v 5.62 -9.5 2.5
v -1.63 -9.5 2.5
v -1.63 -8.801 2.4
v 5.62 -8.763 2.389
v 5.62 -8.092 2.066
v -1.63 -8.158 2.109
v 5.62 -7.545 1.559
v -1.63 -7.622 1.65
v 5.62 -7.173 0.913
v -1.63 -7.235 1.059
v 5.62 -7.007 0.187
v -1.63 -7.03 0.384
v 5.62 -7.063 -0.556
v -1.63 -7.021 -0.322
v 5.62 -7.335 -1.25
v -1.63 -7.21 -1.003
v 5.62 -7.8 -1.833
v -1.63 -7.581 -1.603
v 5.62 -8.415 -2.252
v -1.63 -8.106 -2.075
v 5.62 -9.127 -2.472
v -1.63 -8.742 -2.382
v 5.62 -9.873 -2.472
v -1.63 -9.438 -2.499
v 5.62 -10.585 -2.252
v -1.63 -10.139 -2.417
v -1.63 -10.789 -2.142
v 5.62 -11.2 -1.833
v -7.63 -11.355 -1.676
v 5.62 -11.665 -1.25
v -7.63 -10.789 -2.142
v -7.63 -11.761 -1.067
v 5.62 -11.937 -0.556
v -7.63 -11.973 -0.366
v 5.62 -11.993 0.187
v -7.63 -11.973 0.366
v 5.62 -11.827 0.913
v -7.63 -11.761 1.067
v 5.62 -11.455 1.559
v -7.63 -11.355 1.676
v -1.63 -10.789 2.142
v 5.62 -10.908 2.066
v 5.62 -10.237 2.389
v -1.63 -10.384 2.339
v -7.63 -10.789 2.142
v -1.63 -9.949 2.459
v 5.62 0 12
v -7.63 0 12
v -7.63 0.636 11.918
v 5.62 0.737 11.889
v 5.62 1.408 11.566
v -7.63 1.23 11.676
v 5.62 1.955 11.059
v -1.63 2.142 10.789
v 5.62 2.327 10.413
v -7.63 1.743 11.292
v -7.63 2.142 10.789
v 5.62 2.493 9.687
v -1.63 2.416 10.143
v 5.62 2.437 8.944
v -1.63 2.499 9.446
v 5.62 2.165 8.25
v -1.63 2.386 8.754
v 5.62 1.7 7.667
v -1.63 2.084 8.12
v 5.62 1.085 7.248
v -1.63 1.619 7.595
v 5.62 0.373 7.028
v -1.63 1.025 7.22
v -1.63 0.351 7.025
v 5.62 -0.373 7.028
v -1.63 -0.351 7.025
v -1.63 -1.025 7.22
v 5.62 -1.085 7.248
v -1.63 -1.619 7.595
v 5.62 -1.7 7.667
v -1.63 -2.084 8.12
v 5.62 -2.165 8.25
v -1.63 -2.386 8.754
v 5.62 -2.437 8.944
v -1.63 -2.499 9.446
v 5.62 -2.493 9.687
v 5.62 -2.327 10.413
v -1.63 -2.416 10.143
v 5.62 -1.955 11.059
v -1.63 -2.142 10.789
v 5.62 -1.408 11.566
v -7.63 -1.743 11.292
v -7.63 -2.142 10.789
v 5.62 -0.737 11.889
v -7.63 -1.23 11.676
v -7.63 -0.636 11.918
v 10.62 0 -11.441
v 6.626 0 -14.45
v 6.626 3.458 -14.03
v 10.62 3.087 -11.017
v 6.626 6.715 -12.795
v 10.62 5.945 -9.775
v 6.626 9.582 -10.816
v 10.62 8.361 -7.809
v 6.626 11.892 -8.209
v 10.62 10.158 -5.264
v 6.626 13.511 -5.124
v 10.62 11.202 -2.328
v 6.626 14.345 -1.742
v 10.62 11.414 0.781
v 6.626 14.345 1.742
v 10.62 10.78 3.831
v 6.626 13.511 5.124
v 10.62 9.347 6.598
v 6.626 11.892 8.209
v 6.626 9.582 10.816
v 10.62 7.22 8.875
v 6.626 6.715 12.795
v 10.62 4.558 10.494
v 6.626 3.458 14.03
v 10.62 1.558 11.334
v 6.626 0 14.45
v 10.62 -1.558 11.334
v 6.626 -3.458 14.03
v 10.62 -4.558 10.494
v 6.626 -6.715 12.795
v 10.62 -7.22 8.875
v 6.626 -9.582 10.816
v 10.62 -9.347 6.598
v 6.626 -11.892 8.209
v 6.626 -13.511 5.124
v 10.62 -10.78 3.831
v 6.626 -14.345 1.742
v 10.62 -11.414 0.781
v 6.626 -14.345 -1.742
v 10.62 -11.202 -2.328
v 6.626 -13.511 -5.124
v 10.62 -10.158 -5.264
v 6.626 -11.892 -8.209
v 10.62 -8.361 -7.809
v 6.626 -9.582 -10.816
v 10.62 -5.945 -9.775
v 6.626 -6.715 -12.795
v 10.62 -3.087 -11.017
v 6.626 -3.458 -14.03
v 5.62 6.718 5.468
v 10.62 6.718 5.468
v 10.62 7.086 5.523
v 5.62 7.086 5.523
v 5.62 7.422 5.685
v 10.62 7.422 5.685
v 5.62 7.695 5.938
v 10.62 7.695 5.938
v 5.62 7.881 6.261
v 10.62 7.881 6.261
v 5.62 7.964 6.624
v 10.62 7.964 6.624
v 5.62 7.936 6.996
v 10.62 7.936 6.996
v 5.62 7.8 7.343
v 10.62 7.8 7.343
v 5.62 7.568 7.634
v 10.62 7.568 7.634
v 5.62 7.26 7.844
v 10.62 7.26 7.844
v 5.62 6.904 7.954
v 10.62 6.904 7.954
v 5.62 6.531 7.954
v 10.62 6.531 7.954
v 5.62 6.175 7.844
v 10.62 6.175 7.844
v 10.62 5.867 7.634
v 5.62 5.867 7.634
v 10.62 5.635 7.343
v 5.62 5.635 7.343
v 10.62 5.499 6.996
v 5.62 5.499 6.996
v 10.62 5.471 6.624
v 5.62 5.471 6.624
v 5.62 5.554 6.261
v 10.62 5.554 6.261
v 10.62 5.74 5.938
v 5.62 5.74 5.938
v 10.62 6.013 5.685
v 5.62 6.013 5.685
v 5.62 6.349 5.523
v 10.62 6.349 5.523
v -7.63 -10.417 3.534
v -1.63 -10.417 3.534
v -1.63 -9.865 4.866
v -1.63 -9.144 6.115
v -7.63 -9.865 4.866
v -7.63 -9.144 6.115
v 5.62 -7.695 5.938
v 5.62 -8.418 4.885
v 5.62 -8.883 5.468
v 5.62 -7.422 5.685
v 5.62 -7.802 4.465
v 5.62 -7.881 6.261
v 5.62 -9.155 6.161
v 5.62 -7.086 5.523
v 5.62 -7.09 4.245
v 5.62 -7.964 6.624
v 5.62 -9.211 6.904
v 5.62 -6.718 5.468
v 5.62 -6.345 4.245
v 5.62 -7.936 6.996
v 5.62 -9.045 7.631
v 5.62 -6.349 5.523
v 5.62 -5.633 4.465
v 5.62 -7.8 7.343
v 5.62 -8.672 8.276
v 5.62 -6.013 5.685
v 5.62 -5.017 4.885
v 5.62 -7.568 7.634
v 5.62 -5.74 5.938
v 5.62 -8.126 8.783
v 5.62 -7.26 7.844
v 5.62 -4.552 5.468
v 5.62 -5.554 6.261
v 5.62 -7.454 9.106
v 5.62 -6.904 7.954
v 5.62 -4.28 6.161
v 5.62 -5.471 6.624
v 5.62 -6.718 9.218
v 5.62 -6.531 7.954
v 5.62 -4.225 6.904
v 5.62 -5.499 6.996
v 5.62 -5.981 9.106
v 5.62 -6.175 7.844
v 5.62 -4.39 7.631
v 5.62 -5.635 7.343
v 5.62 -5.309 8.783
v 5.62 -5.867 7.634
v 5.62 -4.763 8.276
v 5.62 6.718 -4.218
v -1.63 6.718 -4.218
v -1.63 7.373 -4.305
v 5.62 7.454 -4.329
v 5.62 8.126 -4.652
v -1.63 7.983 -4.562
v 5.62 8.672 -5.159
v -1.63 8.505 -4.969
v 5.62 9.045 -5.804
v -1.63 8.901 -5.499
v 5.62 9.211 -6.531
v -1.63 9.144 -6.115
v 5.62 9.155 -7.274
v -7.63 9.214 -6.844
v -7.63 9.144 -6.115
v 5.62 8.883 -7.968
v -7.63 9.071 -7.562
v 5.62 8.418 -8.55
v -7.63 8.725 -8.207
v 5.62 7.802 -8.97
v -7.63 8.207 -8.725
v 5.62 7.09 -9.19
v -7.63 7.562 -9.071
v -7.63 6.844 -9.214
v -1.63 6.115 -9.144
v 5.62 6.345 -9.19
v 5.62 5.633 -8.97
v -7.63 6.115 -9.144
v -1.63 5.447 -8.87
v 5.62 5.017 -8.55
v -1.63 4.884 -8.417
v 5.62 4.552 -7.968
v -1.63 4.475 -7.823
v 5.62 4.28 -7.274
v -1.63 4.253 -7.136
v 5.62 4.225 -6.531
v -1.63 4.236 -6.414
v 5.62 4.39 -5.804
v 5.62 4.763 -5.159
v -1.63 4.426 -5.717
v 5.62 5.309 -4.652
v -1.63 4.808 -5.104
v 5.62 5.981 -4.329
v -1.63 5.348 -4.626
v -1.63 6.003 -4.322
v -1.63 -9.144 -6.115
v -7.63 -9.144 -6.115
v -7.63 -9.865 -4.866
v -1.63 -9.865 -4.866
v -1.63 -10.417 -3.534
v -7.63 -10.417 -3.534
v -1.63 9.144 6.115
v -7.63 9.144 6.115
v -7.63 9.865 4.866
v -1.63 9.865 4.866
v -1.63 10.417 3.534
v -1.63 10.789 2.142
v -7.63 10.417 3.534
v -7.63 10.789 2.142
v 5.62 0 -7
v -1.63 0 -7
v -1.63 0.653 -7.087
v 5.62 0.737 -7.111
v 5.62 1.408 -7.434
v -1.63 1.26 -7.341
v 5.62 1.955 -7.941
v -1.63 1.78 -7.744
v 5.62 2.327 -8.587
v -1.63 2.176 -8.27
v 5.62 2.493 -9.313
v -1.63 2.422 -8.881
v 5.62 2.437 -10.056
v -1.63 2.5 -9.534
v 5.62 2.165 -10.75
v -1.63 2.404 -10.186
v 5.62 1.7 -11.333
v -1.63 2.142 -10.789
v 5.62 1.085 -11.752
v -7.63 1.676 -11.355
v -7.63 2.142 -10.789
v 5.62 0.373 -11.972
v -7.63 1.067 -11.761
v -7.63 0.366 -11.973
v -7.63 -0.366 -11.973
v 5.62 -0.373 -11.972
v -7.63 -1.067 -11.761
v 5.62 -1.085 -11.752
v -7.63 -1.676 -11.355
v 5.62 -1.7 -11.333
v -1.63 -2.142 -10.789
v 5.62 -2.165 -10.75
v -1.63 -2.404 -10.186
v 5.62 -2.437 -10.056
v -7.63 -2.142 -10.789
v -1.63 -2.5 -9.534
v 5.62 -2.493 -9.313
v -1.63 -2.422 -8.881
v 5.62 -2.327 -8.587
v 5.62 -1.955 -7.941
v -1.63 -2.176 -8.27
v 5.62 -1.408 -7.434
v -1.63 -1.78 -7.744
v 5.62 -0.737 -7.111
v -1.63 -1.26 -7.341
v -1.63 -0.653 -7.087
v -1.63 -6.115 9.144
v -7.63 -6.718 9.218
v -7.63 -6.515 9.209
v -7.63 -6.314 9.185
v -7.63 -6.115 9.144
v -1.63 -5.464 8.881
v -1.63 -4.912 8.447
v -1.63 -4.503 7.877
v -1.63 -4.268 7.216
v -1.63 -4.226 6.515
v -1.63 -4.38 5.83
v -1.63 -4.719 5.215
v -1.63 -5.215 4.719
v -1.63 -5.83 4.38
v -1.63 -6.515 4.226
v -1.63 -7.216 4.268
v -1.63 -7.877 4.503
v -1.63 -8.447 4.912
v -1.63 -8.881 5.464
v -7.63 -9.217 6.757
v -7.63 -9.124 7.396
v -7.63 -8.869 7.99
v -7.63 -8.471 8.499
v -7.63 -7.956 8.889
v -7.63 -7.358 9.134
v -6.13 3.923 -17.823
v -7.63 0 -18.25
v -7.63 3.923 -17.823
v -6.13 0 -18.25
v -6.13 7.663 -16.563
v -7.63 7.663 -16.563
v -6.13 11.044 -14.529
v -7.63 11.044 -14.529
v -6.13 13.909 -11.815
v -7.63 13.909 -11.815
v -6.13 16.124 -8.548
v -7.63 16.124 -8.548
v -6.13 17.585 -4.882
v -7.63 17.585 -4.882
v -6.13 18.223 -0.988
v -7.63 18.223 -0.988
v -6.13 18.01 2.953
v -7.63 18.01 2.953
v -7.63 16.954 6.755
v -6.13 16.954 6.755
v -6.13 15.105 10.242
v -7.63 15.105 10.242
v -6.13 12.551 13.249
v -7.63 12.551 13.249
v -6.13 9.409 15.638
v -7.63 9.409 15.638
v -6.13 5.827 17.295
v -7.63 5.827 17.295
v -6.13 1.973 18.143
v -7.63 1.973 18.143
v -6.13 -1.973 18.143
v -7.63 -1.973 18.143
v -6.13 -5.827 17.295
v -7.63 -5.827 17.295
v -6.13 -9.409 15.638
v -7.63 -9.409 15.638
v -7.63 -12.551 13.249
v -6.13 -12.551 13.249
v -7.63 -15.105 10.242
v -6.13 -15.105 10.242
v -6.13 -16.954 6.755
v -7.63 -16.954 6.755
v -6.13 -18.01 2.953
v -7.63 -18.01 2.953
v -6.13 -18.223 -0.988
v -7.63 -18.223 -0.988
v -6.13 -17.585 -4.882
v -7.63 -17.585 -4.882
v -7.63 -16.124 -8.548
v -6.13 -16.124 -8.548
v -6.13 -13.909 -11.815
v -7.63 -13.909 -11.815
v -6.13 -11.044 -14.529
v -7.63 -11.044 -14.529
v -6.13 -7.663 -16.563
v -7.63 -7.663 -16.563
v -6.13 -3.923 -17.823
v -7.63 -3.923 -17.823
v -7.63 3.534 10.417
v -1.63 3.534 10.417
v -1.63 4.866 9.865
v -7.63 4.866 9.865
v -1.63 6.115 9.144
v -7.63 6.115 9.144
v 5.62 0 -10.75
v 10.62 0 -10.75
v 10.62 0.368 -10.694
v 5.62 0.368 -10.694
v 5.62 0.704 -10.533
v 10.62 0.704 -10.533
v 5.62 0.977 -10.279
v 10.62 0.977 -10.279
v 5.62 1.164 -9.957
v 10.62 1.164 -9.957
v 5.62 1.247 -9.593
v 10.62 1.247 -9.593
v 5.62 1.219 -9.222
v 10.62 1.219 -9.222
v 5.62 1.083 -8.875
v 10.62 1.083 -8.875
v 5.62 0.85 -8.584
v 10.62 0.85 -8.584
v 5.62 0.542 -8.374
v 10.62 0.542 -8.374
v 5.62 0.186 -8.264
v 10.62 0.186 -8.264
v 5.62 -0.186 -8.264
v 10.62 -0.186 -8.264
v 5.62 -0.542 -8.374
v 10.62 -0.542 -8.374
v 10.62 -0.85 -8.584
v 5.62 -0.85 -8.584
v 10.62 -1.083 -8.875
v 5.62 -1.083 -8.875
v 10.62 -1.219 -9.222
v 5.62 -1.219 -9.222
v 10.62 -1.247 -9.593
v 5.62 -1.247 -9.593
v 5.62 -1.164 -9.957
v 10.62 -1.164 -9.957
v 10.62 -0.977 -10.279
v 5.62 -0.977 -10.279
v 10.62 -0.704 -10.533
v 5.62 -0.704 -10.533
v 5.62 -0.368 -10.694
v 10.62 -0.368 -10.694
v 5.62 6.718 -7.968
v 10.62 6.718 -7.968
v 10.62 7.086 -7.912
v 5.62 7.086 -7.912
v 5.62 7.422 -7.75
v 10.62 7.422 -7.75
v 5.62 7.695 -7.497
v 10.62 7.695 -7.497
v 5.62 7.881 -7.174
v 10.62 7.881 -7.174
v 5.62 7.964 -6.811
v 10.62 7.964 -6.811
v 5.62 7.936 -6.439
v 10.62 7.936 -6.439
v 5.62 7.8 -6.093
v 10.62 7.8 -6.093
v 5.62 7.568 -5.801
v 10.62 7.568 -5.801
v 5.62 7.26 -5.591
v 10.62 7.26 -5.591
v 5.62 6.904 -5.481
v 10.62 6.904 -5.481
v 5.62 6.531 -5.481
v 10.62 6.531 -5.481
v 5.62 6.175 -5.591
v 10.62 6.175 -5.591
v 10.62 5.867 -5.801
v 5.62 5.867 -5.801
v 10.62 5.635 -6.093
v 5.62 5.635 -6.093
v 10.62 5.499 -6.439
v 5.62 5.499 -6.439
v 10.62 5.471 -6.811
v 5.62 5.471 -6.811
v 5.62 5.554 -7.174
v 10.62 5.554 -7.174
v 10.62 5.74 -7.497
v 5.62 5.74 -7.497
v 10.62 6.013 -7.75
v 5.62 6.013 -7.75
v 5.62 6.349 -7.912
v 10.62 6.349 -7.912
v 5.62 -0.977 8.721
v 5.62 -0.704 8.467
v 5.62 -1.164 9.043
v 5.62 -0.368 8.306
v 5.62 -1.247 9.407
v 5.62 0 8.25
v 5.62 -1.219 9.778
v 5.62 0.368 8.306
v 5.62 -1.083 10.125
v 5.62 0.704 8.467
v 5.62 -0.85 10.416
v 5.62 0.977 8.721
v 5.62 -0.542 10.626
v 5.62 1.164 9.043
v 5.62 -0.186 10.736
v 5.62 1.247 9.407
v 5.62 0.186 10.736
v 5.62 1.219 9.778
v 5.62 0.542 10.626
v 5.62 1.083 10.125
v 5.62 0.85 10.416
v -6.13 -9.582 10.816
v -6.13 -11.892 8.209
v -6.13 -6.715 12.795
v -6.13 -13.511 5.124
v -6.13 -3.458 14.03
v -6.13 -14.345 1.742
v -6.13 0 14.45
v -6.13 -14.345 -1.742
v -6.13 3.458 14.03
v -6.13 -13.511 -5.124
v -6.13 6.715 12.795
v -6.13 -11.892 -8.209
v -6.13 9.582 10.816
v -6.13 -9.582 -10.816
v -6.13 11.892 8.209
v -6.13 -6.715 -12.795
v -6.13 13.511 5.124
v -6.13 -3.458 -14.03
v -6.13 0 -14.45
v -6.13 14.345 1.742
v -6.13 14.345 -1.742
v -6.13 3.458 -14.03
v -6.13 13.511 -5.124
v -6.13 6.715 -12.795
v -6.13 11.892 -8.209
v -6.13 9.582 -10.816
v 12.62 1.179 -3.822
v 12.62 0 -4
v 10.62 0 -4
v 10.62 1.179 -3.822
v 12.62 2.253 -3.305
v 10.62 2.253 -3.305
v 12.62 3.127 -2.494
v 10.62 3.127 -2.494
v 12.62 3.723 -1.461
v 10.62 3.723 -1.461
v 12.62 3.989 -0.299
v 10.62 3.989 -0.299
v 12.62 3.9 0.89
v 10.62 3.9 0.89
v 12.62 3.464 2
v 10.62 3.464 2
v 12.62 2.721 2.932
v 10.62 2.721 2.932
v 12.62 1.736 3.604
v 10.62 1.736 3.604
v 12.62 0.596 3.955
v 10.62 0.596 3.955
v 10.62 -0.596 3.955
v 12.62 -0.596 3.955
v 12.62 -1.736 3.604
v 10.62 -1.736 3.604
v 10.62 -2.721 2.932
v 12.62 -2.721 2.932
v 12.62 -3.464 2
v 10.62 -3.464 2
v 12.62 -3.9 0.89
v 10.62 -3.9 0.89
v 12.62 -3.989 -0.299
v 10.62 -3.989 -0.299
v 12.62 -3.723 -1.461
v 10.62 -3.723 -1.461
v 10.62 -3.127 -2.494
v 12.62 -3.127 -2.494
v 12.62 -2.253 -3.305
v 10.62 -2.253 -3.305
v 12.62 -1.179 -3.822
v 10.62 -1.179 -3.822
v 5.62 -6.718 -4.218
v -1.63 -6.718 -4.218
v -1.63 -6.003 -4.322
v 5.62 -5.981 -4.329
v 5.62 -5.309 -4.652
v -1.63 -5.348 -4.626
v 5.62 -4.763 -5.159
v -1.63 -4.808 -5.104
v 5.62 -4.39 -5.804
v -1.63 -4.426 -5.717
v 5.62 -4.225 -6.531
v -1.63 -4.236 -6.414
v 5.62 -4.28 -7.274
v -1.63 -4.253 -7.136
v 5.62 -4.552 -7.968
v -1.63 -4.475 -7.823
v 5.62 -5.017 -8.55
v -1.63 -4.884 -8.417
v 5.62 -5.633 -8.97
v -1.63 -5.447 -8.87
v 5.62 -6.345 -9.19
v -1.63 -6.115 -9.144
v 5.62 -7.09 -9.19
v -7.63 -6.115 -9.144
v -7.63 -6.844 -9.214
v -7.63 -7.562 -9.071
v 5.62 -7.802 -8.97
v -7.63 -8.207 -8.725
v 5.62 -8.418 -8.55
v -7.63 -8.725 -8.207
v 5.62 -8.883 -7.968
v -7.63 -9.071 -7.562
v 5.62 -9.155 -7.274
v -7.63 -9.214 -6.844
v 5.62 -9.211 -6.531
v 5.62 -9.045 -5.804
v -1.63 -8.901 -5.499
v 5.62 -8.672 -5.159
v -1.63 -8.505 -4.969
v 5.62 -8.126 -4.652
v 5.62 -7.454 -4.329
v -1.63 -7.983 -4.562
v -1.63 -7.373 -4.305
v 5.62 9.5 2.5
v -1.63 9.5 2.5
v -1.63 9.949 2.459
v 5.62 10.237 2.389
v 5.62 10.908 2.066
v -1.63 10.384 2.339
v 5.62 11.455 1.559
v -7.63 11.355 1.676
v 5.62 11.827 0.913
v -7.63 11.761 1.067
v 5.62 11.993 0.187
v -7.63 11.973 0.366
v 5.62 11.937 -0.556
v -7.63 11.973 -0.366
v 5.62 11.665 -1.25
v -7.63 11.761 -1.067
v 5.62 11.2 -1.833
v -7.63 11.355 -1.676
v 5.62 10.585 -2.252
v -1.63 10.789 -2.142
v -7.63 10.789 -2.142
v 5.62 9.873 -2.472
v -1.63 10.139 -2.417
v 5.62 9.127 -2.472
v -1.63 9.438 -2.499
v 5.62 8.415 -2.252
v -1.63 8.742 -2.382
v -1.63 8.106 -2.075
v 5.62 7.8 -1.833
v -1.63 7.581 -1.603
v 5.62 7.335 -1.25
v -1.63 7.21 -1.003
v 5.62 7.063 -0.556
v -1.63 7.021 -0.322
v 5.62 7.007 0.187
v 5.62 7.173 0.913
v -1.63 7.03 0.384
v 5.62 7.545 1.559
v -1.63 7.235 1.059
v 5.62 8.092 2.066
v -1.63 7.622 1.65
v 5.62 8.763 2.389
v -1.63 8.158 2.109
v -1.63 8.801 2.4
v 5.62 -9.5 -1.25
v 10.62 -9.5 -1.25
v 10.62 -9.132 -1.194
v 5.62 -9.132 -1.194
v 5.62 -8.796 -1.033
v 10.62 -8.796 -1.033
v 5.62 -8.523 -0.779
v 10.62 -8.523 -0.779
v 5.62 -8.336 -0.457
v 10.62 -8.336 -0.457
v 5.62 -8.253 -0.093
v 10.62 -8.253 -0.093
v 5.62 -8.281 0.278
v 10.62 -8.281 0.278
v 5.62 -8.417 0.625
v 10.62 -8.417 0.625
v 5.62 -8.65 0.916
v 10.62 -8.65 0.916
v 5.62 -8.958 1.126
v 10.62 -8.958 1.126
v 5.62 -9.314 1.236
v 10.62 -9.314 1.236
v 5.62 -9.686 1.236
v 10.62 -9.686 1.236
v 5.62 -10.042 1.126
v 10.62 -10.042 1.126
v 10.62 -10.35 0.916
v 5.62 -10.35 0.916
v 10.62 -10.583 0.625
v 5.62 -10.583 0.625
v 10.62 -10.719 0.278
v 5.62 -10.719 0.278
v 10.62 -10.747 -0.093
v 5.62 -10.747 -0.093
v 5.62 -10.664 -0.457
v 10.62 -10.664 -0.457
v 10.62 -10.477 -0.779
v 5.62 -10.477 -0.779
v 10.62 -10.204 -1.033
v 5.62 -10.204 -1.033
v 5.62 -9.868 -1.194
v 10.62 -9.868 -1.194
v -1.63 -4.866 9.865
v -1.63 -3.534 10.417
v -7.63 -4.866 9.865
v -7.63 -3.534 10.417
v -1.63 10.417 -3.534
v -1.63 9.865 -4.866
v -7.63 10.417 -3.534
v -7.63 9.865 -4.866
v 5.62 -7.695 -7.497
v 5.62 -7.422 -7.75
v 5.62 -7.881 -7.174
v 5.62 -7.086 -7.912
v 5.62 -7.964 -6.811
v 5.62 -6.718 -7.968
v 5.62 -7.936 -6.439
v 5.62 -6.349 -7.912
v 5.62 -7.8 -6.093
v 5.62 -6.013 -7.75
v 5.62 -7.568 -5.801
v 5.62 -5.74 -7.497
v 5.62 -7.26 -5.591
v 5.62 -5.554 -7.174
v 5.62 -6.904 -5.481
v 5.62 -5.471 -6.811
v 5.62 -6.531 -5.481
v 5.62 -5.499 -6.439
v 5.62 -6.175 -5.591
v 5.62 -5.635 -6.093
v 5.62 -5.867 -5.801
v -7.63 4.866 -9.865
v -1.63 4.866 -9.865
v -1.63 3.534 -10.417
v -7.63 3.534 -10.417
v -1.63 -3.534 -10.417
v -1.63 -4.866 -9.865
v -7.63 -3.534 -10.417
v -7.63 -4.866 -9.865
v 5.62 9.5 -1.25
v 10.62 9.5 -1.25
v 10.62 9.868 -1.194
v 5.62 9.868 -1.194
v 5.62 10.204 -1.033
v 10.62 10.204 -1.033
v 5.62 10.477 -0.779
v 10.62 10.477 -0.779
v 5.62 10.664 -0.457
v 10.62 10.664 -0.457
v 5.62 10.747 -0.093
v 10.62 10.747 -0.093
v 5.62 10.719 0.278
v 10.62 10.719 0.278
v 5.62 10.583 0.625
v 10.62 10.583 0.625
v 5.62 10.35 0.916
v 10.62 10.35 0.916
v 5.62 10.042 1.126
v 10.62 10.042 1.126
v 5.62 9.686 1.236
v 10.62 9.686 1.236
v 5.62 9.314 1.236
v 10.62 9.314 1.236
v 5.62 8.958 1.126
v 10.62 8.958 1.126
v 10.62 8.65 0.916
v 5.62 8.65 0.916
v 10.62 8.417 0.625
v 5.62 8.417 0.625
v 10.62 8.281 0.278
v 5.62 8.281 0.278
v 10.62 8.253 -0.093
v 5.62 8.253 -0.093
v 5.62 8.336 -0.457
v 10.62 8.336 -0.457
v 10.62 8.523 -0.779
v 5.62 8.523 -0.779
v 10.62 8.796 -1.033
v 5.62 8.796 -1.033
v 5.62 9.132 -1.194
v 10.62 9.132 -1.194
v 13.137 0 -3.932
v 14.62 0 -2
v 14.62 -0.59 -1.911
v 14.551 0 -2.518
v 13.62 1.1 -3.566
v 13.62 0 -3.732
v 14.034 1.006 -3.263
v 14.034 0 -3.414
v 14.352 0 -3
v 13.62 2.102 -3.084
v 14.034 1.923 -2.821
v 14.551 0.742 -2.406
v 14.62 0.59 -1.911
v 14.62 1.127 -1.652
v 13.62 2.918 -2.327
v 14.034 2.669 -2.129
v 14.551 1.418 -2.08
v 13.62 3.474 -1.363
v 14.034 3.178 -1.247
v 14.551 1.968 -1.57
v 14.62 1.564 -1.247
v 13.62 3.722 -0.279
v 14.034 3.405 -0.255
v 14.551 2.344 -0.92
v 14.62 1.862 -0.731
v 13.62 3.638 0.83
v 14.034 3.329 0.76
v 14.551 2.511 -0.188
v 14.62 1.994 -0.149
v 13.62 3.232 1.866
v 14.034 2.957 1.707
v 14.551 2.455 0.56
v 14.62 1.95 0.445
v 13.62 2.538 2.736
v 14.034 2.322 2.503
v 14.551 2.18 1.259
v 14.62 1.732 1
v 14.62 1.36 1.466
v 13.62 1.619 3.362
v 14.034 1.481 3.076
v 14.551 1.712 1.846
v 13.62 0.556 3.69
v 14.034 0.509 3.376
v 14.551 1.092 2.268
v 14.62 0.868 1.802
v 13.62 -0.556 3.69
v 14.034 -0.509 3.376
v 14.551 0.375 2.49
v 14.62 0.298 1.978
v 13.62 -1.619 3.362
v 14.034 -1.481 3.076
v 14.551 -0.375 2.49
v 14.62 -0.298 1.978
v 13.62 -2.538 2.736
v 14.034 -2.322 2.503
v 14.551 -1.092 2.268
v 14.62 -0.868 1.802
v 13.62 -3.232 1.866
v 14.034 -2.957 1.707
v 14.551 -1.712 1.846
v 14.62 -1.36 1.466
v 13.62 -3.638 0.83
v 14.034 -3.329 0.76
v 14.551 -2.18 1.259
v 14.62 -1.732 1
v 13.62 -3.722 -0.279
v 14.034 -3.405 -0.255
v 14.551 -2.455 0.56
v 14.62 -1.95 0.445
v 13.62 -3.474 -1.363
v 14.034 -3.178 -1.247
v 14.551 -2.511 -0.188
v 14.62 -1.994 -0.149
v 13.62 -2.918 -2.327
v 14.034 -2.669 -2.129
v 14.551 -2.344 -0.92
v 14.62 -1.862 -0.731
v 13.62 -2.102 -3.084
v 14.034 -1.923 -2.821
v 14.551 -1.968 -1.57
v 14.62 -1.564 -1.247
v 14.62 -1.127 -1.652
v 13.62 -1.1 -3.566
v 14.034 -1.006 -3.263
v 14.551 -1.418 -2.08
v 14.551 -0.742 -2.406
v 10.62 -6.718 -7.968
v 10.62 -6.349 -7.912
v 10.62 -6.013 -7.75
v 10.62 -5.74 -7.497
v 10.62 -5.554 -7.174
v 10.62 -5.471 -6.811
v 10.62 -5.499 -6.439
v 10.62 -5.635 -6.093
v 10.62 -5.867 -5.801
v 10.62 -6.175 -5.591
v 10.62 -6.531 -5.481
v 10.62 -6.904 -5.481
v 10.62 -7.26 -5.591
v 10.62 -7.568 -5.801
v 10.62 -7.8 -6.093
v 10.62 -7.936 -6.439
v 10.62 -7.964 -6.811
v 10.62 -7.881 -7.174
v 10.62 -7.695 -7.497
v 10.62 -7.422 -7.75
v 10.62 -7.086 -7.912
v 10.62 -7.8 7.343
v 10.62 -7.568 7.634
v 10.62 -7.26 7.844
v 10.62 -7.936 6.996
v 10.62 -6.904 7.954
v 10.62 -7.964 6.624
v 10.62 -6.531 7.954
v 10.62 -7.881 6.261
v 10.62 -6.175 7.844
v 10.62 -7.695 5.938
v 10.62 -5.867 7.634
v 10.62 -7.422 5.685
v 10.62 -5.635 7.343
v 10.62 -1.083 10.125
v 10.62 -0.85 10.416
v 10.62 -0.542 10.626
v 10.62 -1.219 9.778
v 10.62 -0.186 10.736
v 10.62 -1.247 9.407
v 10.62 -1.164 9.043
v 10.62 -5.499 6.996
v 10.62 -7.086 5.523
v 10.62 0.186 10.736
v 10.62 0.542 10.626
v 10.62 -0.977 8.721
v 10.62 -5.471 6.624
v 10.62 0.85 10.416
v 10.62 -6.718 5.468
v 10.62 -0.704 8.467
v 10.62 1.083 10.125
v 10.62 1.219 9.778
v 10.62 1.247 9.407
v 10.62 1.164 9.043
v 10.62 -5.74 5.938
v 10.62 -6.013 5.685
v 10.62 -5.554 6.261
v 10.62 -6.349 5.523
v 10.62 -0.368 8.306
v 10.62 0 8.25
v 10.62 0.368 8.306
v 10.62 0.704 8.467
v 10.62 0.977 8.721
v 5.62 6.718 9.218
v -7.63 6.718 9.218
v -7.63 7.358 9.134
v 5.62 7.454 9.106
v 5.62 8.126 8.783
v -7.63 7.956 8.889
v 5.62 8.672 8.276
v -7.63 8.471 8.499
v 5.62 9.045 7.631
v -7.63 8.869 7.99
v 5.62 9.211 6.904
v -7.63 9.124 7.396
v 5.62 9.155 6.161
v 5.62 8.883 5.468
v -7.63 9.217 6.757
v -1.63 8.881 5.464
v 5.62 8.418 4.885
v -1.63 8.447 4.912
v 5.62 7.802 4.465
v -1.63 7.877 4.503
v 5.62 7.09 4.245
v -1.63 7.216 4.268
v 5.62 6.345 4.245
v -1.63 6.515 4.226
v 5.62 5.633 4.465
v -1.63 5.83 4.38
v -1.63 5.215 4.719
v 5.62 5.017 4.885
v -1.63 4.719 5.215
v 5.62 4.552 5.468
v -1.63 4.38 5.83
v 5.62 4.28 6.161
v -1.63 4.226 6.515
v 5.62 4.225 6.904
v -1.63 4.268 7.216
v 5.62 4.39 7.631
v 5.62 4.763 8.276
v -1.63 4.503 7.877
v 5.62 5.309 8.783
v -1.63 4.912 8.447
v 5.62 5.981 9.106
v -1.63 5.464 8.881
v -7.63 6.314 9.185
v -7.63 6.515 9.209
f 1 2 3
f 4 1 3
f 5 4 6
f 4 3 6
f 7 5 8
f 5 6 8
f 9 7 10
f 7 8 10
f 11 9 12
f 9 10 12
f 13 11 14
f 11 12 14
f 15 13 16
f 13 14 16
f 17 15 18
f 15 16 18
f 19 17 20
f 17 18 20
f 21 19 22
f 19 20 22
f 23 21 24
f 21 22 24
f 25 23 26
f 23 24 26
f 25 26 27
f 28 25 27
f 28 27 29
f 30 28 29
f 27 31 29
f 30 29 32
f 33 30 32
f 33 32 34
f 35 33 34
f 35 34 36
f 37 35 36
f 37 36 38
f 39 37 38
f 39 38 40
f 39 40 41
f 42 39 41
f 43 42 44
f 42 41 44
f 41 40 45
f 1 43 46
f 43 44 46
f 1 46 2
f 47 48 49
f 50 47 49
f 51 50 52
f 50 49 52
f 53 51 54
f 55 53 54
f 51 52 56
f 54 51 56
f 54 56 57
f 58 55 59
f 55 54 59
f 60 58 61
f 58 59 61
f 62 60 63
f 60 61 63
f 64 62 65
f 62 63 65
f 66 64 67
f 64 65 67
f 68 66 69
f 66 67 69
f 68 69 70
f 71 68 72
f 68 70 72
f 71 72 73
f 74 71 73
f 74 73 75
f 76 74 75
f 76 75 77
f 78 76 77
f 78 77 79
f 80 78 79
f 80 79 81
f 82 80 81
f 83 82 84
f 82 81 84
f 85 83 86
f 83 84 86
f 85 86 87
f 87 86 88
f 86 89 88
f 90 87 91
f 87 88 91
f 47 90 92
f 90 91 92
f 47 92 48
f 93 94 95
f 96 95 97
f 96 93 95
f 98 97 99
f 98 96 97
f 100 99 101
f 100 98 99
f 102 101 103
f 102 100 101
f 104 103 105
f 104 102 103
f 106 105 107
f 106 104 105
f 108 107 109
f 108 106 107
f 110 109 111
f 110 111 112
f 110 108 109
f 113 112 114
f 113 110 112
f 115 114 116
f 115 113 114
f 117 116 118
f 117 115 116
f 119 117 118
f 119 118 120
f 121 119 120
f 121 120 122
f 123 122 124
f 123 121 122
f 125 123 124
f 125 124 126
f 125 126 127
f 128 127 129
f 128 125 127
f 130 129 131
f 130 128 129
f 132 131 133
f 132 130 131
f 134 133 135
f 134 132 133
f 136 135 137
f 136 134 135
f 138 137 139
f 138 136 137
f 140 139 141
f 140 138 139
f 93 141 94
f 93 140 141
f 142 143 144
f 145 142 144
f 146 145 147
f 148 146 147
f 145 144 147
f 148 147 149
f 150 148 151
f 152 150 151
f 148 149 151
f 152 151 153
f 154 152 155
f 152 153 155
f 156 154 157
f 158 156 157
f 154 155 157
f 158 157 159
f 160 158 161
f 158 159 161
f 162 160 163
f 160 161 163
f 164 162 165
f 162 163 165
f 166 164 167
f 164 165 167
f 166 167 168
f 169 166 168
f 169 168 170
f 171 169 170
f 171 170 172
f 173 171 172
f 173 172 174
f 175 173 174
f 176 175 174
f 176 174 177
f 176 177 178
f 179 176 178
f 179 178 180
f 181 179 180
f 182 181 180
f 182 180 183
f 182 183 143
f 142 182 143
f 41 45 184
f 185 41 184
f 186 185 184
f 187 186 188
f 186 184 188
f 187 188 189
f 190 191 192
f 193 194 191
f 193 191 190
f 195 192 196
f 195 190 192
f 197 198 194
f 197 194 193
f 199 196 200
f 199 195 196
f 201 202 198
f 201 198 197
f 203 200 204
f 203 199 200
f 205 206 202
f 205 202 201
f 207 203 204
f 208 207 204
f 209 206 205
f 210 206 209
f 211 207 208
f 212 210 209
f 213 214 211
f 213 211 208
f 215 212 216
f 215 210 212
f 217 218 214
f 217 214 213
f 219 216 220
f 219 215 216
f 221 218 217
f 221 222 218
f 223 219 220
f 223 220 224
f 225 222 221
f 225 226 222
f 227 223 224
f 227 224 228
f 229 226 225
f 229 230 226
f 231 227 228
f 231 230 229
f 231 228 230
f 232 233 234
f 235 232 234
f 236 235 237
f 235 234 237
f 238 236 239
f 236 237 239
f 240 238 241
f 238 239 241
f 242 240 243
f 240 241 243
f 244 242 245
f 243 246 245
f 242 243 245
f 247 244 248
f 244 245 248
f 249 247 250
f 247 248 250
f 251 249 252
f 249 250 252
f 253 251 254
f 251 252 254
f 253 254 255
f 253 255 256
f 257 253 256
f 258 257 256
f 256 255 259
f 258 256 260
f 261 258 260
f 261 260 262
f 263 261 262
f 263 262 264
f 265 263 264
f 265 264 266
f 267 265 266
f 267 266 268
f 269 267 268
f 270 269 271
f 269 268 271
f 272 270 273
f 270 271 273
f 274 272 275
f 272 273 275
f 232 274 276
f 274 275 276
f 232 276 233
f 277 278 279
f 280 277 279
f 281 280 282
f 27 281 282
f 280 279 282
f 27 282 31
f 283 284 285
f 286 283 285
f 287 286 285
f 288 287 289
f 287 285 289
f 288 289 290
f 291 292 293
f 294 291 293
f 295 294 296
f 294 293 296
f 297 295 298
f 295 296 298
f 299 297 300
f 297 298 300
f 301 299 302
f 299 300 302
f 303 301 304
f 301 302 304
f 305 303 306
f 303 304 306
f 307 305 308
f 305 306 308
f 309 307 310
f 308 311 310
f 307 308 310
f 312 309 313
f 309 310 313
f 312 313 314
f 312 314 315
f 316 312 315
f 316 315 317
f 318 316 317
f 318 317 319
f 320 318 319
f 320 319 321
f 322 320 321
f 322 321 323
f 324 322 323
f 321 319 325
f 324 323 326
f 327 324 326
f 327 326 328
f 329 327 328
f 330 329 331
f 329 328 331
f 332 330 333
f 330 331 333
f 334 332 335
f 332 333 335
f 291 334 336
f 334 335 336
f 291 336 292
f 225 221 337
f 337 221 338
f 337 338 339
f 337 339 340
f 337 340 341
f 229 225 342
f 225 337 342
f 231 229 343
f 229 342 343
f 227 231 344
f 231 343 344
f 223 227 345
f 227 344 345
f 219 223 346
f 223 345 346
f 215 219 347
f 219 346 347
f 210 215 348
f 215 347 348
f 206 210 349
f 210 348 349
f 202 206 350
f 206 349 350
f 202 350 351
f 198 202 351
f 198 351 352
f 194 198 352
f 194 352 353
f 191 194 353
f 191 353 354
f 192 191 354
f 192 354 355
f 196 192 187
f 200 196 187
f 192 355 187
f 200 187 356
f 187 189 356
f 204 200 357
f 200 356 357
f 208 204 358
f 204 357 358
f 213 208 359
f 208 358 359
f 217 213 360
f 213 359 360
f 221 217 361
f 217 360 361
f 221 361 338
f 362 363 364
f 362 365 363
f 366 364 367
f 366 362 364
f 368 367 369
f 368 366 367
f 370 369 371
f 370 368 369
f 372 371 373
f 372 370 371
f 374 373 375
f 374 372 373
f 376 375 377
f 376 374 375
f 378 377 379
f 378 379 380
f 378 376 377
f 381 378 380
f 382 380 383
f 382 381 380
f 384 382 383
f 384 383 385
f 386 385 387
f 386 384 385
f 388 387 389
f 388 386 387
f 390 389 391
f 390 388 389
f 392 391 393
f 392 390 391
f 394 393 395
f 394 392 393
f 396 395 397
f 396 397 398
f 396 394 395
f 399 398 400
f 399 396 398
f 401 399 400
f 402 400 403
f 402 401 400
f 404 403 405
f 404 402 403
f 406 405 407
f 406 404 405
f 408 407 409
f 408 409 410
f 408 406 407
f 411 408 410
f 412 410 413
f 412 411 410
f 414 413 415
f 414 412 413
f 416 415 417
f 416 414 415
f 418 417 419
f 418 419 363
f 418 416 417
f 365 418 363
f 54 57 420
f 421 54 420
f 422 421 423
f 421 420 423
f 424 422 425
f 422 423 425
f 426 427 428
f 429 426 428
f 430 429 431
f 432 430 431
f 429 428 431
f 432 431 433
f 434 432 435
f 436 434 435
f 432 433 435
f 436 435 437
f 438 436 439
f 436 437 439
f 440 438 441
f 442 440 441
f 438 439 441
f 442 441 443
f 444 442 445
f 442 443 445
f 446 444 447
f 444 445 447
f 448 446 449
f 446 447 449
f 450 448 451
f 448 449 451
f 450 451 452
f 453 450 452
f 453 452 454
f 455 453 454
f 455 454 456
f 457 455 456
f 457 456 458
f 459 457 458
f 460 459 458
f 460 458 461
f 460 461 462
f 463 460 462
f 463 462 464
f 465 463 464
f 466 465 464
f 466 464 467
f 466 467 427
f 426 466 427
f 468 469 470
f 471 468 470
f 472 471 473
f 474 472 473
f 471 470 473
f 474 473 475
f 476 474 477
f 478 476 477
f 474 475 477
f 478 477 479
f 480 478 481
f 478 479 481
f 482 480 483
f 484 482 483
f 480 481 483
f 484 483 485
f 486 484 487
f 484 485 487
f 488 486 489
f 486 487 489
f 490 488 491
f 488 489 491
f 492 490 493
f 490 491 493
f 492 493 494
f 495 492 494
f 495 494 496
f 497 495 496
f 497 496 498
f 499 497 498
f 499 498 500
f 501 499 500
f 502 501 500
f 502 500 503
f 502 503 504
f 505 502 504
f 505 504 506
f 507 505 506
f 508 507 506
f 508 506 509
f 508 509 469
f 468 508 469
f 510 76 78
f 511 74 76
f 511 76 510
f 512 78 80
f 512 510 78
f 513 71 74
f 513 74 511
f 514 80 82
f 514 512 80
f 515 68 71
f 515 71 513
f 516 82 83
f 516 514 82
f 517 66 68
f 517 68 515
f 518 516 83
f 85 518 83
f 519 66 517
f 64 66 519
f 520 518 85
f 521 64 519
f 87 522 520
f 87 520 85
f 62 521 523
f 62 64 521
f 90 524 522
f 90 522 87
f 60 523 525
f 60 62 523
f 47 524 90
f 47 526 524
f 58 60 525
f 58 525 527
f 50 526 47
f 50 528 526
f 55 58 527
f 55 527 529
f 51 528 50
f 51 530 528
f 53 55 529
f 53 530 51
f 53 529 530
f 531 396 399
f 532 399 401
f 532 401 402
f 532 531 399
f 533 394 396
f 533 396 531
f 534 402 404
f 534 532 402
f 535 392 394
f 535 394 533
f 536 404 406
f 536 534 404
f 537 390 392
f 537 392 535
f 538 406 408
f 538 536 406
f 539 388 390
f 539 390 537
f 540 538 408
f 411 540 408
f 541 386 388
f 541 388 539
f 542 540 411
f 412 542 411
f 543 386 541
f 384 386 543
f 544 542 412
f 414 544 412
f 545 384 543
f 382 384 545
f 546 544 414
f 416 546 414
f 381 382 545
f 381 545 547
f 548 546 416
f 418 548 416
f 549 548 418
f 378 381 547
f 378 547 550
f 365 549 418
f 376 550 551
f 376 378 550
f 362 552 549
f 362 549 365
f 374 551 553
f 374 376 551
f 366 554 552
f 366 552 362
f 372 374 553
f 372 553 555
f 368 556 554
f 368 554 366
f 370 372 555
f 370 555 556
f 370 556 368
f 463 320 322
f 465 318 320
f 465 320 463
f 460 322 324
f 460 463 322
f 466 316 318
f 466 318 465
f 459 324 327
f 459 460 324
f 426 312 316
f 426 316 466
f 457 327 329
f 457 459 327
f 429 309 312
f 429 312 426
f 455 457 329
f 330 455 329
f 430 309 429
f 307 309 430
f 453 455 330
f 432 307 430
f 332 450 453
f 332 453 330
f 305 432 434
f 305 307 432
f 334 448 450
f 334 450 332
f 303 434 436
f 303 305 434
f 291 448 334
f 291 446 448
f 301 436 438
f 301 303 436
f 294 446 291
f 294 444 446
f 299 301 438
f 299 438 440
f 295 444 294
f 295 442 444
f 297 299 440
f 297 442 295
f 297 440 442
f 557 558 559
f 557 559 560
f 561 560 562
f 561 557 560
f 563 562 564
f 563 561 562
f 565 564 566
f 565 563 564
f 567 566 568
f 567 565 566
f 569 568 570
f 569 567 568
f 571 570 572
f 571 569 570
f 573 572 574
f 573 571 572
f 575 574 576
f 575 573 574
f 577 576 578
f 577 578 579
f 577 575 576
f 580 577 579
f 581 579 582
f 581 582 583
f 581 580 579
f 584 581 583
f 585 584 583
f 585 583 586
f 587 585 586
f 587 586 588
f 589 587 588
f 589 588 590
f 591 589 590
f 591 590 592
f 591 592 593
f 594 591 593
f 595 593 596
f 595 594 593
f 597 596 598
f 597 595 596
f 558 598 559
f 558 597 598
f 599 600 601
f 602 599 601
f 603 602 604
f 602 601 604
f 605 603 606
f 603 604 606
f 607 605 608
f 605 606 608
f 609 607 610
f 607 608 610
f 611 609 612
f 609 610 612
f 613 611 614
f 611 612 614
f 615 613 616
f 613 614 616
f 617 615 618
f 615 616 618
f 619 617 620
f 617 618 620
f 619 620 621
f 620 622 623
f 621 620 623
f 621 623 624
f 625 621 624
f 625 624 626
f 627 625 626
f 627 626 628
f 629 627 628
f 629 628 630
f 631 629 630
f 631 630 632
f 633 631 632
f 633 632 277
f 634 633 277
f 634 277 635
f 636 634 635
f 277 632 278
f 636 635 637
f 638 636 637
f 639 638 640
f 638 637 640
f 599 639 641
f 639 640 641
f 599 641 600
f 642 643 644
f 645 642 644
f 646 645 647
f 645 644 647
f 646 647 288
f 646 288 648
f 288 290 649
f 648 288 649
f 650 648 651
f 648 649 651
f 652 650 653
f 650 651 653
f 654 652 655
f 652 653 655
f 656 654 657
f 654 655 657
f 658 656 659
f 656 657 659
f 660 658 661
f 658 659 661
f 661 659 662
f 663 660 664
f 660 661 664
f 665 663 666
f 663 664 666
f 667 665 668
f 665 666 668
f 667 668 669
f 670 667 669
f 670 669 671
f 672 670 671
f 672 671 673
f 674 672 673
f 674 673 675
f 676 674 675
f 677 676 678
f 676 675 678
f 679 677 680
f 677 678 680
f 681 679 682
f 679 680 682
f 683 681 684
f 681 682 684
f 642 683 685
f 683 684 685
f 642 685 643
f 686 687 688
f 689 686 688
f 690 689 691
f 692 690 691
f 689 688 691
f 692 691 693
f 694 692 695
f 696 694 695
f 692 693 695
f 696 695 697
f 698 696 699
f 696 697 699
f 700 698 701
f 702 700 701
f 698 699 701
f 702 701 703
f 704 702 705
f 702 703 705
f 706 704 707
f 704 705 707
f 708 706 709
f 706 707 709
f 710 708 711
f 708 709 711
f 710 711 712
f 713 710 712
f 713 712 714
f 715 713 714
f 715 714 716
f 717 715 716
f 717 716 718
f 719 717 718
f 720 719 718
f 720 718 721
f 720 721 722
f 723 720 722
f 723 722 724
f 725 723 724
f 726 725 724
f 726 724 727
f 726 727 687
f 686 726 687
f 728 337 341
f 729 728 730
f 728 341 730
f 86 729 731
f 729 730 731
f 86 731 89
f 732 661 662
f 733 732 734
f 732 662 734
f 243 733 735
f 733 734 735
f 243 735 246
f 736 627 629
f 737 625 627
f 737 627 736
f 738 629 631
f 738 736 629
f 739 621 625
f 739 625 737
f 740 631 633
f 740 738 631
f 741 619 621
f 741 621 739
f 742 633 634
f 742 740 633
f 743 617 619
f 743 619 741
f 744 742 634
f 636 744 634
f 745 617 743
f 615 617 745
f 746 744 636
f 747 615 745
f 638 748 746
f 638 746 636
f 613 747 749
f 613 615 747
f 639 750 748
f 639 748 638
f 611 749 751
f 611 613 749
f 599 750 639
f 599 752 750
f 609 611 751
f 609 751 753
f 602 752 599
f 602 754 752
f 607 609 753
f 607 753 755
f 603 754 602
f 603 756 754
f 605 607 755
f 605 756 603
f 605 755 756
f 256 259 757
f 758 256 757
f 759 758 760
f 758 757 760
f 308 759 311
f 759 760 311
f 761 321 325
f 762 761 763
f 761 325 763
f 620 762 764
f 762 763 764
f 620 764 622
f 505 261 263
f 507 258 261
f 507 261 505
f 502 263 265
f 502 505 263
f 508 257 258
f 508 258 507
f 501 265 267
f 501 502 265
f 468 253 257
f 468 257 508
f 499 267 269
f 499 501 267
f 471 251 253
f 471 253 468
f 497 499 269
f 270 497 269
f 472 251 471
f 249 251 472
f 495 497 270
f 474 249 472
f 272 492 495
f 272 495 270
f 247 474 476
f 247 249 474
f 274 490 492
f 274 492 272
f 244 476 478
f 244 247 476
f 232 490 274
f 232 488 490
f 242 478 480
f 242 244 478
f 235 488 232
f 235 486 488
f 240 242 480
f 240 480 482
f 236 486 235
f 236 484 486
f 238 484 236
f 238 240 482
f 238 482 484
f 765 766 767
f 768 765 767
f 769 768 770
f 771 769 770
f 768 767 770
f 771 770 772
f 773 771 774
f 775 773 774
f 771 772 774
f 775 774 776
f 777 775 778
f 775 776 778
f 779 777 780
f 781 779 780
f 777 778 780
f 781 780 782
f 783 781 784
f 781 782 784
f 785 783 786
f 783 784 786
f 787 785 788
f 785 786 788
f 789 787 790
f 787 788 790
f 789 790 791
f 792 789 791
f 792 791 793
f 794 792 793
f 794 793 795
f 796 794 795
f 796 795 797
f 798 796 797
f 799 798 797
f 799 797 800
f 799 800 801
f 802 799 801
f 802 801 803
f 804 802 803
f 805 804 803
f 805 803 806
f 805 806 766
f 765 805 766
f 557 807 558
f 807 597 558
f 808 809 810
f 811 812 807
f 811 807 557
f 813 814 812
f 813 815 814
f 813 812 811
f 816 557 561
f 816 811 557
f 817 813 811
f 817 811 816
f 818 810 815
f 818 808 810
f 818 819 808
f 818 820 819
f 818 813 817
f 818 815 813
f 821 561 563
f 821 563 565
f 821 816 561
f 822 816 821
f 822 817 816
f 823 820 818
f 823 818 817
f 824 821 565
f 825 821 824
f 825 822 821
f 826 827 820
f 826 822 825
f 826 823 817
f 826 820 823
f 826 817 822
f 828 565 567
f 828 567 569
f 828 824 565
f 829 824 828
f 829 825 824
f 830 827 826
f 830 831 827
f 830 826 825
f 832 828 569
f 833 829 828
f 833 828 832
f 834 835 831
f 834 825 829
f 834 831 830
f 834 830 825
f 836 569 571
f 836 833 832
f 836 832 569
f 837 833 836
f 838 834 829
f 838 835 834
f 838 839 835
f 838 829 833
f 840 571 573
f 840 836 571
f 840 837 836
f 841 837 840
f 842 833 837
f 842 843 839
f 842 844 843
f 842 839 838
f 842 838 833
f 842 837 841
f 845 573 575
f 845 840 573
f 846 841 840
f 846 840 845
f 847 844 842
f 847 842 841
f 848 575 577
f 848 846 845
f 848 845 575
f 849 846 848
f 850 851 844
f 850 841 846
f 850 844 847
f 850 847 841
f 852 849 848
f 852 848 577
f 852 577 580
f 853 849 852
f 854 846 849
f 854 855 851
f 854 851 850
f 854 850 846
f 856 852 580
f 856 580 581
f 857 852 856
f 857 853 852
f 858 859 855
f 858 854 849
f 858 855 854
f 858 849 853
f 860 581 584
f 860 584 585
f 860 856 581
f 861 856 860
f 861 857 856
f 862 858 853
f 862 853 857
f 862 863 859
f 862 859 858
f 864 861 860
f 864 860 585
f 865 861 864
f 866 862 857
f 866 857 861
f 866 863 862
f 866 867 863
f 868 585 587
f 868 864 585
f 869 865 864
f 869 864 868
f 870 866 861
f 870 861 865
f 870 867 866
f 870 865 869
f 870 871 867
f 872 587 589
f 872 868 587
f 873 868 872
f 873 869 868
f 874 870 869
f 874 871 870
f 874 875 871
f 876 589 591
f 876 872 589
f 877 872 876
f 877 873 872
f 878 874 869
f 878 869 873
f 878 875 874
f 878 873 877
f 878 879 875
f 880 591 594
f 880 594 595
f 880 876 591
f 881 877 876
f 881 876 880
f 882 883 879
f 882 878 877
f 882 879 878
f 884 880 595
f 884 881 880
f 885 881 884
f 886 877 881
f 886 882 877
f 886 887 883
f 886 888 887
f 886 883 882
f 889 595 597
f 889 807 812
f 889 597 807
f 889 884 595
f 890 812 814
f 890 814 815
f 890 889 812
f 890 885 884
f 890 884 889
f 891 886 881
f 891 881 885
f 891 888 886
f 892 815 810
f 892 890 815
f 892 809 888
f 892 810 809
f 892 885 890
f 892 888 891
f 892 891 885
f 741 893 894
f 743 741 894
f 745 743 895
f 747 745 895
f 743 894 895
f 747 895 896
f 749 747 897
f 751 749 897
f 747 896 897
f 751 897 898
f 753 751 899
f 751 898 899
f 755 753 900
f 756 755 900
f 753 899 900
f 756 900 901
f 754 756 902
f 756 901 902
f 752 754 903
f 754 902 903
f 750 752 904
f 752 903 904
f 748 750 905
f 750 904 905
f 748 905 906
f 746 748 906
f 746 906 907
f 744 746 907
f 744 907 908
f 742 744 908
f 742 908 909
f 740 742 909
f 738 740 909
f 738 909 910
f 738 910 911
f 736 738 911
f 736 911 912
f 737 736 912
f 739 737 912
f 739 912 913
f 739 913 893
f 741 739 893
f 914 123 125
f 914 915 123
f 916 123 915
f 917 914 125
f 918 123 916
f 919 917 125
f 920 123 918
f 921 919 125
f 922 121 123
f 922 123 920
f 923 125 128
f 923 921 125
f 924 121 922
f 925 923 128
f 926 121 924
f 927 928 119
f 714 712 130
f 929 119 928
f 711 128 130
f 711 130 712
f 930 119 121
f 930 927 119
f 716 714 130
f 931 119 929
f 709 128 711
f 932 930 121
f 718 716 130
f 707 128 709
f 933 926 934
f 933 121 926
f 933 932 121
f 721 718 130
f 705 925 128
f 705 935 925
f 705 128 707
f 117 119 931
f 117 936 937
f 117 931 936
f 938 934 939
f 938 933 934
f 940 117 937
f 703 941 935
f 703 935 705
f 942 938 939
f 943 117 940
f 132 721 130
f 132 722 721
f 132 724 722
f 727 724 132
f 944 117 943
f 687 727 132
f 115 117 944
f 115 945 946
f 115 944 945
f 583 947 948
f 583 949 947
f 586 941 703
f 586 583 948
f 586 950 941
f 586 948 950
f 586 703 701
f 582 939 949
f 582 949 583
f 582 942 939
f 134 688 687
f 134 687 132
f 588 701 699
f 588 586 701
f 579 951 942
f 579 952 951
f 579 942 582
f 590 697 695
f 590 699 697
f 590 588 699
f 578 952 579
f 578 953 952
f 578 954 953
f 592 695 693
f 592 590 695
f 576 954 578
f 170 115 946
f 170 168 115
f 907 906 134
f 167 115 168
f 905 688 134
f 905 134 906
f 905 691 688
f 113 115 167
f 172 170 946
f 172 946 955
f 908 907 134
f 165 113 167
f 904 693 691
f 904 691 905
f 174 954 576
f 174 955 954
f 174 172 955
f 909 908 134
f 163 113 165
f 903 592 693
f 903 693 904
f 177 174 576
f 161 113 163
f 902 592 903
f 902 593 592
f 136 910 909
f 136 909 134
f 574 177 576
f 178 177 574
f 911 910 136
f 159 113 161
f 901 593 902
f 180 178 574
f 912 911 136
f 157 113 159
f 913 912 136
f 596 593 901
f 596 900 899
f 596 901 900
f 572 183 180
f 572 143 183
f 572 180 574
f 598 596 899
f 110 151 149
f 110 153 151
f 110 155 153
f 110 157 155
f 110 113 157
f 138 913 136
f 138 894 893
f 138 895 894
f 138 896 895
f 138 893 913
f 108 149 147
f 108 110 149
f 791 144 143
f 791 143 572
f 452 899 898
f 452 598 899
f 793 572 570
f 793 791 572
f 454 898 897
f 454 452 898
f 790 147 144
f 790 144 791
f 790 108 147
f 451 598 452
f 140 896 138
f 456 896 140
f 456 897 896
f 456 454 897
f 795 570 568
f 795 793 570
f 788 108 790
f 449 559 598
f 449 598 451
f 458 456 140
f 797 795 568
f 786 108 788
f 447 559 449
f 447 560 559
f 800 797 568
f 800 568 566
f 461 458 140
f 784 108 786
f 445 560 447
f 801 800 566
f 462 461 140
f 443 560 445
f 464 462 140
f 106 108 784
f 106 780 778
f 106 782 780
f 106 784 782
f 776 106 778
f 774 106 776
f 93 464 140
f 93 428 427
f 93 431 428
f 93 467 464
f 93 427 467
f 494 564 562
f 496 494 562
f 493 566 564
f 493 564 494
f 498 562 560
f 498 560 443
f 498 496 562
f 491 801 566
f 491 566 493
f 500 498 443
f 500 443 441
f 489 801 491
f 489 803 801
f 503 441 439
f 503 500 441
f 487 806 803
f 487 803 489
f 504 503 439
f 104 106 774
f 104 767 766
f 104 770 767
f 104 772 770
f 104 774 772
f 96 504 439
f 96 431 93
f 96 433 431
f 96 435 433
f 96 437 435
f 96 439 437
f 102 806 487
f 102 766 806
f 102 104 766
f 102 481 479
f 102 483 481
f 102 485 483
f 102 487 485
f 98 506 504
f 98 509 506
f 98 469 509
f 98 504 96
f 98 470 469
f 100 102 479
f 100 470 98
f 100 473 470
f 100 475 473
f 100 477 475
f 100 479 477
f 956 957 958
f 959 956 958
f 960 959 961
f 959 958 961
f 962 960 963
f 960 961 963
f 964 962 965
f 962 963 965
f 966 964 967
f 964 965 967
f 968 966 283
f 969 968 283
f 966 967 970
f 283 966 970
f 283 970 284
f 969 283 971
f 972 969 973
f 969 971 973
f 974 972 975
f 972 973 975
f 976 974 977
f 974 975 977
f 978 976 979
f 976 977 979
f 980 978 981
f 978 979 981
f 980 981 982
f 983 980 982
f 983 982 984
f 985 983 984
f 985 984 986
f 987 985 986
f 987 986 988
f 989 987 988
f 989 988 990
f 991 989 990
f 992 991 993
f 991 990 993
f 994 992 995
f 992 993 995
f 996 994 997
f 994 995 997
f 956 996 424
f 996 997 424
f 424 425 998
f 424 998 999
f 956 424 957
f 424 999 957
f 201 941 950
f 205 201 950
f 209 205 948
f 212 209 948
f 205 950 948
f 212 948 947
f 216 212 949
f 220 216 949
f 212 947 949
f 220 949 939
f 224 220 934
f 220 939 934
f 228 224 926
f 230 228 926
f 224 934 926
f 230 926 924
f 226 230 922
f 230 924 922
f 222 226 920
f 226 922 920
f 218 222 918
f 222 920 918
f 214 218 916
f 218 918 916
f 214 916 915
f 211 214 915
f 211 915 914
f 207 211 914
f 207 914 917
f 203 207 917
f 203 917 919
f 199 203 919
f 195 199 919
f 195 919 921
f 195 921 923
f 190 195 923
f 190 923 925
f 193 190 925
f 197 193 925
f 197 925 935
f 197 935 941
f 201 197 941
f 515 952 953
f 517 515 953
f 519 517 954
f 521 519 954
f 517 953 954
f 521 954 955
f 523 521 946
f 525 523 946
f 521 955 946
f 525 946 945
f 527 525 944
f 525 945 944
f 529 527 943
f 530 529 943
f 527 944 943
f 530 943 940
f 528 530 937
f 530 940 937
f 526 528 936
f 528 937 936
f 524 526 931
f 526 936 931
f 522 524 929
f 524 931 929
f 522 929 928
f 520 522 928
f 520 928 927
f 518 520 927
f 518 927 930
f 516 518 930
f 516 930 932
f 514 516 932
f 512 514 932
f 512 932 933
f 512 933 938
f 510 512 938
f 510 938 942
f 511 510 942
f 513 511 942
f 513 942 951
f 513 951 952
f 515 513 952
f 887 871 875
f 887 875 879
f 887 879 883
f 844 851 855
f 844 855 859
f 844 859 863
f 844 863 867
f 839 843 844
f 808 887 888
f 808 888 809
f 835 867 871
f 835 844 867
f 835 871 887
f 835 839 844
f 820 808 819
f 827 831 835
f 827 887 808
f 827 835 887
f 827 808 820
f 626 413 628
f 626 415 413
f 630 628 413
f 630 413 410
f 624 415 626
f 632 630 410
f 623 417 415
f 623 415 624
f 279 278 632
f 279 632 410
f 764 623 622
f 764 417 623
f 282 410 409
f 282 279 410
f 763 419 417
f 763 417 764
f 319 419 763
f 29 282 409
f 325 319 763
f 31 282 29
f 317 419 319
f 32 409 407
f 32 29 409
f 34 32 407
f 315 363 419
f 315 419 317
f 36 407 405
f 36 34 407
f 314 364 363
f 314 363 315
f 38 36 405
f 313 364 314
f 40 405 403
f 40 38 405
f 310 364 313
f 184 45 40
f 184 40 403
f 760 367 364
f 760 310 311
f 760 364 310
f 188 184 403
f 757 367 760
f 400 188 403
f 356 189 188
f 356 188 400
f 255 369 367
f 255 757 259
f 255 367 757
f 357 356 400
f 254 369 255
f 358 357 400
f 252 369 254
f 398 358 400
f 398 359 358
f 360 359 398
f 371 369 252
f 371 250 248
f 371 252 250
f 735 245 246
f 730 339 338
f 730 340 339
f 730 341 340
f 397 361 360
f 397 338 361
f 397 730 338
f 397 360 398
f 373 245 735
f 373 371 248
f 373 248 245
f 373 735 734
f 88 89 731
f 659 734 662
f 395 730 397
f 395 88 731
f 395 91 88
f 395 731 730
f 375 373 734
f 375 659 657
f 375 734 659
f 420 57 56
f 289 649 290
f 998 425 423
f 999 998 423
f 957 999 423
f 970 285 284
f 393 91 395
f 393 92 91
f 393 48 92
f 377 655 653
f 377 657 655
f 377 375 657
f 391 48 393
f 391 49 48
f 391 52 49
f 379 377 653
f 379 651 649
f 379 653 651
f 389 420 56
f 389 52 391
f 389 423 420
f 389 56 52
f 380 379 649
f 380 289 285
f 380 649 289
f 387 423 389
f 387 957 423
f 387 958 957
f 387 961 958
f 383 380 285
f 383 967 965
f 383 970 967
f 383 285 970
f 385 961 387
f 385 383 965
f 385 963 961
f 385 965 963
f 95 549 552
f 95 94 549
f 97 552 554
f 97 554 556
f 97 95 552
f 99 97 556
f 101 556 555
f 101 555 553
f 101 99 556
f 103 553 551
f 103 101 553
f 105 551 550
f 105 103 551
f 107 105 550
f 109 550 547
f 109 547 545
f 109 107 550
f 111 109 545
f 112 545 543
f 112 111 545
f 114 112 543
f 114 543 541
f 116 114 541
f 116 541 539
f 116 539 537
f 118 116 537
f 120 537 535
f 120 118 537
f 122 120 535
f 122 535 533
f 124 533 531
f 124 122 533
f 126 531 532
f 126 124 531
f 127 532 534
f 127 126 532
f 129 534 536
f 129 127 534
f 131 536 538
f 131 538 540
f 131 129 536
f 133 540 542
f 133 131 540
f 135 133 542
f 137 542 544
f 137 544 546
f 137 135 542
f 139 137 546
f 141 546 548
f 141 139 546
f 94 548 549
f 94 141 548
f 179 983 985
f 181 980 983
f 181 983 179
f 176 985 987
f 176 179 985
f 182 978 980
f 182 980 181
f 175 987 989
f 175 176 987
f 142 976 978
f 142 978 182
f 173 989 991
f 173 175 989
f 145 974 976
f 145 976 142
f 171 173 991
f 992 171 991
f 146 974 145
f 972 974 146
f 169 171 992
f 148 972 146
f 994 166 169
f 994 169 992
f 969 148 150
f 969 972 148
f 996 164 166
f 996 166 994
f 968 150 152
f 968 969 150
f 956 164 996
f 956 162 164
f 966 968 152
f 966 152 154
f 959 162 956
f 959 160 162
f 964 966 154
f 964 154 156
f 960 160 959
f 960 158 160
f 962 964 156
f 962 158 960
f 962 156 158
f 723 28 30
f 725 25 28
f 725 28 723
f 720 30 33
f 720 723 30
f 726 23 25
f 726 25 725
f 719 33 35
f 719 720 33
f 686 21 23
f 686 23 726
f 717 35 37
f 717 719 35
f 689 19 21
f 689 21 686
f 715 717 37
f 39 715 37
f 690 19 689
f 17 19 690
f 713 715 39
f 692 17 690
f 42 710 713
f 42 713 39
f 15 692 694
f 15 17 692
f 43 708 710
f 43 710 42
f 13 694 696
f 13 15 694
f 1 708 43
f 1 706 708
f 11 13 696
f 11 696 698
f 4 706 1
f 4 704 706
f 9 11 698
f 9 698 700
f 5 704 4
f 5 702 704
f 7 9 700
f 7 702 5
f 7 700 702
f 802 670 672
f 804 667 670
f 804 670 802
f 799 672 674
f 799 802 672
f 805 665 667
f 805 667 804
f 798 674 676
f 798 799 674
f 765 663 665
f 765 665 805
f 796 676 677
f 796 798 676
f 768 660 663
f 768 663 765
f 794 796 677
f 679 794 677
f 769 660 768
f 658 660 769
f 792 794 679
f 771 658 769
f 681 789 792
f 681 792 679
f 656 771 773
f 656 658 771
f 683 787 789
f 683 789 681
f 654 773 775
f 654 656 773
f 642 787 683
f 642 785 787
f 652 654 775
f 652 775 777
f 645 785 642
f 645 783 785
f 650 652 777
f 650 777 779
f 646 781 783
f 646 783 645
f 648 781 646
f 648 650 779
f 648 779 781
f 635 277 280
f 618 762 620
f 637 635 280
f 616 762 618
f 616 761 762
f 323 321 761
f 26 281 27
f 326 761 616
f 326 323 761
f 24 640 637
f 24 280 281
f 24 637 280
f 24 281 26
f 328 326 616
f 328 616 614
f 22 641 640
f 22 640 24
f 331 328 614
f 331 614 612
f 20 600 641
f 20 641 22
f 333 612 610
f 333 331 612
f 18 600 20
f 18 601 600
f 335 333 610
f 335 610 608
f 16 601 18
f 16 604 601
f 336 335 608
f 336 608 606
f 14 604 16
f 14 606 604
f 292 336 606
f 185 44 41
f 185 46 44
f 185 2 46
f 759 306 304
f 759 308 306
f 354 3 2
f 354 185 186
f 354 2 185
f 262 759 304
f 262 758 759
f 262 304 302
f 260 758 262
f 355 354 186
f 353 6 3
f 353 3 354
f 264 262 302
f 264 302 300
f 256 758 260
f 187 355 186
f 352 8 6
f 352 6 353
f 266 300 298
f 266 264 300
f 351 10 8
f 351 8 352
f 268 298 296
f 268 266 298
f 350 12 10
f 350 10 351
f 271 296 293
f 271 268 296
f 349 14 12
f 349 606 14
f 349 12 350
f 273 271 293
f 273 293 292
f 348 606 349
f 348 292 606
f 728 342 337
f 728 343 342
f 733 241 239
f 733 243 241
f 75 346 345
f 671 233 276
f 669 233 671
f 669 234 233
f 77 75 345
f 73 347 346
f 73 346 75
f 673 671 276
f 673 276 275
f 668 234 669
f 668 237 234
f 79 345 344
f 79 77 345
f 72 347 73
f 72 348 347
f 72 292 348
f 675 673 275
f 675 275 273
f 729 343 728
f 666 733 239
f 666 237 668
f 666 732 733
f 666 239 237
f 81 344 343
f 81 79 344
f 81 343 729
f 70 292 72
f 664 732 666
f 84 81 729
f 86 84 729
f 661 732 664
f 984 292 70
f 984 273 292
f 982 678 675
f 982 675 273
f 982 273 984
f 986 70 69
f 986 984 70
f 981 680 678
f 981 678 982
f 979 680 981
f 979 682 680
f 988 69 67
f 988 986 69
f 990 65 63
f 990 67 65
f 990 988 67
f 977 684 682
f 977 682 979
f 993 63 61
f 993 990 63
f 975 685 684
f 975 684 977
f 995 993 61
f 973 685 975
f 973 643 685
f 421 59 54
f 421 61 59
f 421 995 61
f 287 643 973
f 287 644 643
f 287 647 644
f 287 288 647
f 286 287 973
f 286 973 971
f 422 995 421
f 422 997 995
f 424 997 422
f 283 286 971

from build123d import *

# Parameters (mm, degrees)
SKETCH2_R          = 1.25
CUT_EXTRUDE1_DEPTH = 19.25
FILLET1_R          = 2
SKETCH3_R          = 2.5
CUT_EXTRUDE2_DEPTH = 13.25
SKETCH4_R          = 11
CUT_EXTRUDE3_DEPTH = 6


with BuildPart() as part:
    # Sketch1 → Revolve1 (revolve)
    with BuildSketch(Plane(origin=(0, 0, 0), x_dir=(1, 0, 0), z_dir=(0, 1, 0))):
        Polygon((-6.130434783, 14.45), (6.626387667, 14.45), (10.619565217, 11.440924884), (10.619565217, 4), (14.619565217, 4), (14.619565217, 0), (13.372742768, 0), (-6.130434783, 0), (-7.630434783, 0), (-7.630434783, 18.25), (-6.130434783, 18.25), align=None)
    revolve(axis=Axis((-12.391304348, 0, 0), (1, 0, 0)))

    # Sketch2 → Cut-Extrude1 (cut, through all)
    with BuildSketch(Plane(origin=(10.619565217, 0, 0), x_dir=(0, 0, -1), z_dir=(1, 0, 0))):
        with Locations((0, 9.5)):
            Circle(SKETCH2_R)
        with Locations((6.717514421, 6.717514421)):
            Circle(SKETCH2_R)
        with Locations((9.5, 0)):
            Circle(SKETCH2_R)
        with Locations((6.717514421, -6.717514421)):
            Circle(SKETCH2_R)
        with Locations((0, -9.5)):
            Circle(SKETCH2_R)
        with Locations((-6.717514421, -6.717514421)):
            Circle(SKETCH2_R)
        with Locations((-9.5, 0)):
            Circle(SKETCH2_R)
        with Locations((-6.717514421, 6.717514421)):
            Circle(SKETCH2_R)
    extrude(amount=-CUT_EXTRUDE1_DEPTH, mode=Mode.SUBTRACT)

    # Fillet1
    fillet1_edges = [part.edges().sort_by_distance(p)[0] for p in [
        (14.619565217, 0, 4),
    ]]
    fillet(fillet1_edges, radius=FILLET1_R)

    # Sketch3 → Cut-Extrude2 (cut)
    with BuildSketch(Plane.ZY.offset(7.630434783)):
        with Locations((0, 9.5)):
            Circle(SKETCH3_R)
        with Locations((6.717514421, 6.717514421)):
            Circle(SKETCH3_R)
        with Locations((9.5, 0)):
            Circle(SKETCH3_R)
        with Locations((6.717514421, -6.717514421)):
            Circle(SKETCH3_R)
        with Locations((0, -9.5)):
            Circle(SKETCH3_R)
        with Locations((-6.717514421, -6.717514421)):
            Circle(SKETCH3_R)
        with Locations((-9.5, 0)):
            Circle(SKETCH3_R)
        with Locations((-6.717514421, 6.717514421)):
            Circle(SKETCH3_R)
    extrude(amount=-CUT_EXTRUDE2_DEPTH, mode=Mode.SUBTRACT)

    # Sketch4 → Cut-Extrude3 (cut)
    with BuildSketch(Plane.ZY.offset(7.630434783)):
        Circle(SKETCH4_R)
    extrude(amount=-CUT_EXTRUDE3_DEPTH, mode=Mode.SUBTRACT)


solid = part.part
